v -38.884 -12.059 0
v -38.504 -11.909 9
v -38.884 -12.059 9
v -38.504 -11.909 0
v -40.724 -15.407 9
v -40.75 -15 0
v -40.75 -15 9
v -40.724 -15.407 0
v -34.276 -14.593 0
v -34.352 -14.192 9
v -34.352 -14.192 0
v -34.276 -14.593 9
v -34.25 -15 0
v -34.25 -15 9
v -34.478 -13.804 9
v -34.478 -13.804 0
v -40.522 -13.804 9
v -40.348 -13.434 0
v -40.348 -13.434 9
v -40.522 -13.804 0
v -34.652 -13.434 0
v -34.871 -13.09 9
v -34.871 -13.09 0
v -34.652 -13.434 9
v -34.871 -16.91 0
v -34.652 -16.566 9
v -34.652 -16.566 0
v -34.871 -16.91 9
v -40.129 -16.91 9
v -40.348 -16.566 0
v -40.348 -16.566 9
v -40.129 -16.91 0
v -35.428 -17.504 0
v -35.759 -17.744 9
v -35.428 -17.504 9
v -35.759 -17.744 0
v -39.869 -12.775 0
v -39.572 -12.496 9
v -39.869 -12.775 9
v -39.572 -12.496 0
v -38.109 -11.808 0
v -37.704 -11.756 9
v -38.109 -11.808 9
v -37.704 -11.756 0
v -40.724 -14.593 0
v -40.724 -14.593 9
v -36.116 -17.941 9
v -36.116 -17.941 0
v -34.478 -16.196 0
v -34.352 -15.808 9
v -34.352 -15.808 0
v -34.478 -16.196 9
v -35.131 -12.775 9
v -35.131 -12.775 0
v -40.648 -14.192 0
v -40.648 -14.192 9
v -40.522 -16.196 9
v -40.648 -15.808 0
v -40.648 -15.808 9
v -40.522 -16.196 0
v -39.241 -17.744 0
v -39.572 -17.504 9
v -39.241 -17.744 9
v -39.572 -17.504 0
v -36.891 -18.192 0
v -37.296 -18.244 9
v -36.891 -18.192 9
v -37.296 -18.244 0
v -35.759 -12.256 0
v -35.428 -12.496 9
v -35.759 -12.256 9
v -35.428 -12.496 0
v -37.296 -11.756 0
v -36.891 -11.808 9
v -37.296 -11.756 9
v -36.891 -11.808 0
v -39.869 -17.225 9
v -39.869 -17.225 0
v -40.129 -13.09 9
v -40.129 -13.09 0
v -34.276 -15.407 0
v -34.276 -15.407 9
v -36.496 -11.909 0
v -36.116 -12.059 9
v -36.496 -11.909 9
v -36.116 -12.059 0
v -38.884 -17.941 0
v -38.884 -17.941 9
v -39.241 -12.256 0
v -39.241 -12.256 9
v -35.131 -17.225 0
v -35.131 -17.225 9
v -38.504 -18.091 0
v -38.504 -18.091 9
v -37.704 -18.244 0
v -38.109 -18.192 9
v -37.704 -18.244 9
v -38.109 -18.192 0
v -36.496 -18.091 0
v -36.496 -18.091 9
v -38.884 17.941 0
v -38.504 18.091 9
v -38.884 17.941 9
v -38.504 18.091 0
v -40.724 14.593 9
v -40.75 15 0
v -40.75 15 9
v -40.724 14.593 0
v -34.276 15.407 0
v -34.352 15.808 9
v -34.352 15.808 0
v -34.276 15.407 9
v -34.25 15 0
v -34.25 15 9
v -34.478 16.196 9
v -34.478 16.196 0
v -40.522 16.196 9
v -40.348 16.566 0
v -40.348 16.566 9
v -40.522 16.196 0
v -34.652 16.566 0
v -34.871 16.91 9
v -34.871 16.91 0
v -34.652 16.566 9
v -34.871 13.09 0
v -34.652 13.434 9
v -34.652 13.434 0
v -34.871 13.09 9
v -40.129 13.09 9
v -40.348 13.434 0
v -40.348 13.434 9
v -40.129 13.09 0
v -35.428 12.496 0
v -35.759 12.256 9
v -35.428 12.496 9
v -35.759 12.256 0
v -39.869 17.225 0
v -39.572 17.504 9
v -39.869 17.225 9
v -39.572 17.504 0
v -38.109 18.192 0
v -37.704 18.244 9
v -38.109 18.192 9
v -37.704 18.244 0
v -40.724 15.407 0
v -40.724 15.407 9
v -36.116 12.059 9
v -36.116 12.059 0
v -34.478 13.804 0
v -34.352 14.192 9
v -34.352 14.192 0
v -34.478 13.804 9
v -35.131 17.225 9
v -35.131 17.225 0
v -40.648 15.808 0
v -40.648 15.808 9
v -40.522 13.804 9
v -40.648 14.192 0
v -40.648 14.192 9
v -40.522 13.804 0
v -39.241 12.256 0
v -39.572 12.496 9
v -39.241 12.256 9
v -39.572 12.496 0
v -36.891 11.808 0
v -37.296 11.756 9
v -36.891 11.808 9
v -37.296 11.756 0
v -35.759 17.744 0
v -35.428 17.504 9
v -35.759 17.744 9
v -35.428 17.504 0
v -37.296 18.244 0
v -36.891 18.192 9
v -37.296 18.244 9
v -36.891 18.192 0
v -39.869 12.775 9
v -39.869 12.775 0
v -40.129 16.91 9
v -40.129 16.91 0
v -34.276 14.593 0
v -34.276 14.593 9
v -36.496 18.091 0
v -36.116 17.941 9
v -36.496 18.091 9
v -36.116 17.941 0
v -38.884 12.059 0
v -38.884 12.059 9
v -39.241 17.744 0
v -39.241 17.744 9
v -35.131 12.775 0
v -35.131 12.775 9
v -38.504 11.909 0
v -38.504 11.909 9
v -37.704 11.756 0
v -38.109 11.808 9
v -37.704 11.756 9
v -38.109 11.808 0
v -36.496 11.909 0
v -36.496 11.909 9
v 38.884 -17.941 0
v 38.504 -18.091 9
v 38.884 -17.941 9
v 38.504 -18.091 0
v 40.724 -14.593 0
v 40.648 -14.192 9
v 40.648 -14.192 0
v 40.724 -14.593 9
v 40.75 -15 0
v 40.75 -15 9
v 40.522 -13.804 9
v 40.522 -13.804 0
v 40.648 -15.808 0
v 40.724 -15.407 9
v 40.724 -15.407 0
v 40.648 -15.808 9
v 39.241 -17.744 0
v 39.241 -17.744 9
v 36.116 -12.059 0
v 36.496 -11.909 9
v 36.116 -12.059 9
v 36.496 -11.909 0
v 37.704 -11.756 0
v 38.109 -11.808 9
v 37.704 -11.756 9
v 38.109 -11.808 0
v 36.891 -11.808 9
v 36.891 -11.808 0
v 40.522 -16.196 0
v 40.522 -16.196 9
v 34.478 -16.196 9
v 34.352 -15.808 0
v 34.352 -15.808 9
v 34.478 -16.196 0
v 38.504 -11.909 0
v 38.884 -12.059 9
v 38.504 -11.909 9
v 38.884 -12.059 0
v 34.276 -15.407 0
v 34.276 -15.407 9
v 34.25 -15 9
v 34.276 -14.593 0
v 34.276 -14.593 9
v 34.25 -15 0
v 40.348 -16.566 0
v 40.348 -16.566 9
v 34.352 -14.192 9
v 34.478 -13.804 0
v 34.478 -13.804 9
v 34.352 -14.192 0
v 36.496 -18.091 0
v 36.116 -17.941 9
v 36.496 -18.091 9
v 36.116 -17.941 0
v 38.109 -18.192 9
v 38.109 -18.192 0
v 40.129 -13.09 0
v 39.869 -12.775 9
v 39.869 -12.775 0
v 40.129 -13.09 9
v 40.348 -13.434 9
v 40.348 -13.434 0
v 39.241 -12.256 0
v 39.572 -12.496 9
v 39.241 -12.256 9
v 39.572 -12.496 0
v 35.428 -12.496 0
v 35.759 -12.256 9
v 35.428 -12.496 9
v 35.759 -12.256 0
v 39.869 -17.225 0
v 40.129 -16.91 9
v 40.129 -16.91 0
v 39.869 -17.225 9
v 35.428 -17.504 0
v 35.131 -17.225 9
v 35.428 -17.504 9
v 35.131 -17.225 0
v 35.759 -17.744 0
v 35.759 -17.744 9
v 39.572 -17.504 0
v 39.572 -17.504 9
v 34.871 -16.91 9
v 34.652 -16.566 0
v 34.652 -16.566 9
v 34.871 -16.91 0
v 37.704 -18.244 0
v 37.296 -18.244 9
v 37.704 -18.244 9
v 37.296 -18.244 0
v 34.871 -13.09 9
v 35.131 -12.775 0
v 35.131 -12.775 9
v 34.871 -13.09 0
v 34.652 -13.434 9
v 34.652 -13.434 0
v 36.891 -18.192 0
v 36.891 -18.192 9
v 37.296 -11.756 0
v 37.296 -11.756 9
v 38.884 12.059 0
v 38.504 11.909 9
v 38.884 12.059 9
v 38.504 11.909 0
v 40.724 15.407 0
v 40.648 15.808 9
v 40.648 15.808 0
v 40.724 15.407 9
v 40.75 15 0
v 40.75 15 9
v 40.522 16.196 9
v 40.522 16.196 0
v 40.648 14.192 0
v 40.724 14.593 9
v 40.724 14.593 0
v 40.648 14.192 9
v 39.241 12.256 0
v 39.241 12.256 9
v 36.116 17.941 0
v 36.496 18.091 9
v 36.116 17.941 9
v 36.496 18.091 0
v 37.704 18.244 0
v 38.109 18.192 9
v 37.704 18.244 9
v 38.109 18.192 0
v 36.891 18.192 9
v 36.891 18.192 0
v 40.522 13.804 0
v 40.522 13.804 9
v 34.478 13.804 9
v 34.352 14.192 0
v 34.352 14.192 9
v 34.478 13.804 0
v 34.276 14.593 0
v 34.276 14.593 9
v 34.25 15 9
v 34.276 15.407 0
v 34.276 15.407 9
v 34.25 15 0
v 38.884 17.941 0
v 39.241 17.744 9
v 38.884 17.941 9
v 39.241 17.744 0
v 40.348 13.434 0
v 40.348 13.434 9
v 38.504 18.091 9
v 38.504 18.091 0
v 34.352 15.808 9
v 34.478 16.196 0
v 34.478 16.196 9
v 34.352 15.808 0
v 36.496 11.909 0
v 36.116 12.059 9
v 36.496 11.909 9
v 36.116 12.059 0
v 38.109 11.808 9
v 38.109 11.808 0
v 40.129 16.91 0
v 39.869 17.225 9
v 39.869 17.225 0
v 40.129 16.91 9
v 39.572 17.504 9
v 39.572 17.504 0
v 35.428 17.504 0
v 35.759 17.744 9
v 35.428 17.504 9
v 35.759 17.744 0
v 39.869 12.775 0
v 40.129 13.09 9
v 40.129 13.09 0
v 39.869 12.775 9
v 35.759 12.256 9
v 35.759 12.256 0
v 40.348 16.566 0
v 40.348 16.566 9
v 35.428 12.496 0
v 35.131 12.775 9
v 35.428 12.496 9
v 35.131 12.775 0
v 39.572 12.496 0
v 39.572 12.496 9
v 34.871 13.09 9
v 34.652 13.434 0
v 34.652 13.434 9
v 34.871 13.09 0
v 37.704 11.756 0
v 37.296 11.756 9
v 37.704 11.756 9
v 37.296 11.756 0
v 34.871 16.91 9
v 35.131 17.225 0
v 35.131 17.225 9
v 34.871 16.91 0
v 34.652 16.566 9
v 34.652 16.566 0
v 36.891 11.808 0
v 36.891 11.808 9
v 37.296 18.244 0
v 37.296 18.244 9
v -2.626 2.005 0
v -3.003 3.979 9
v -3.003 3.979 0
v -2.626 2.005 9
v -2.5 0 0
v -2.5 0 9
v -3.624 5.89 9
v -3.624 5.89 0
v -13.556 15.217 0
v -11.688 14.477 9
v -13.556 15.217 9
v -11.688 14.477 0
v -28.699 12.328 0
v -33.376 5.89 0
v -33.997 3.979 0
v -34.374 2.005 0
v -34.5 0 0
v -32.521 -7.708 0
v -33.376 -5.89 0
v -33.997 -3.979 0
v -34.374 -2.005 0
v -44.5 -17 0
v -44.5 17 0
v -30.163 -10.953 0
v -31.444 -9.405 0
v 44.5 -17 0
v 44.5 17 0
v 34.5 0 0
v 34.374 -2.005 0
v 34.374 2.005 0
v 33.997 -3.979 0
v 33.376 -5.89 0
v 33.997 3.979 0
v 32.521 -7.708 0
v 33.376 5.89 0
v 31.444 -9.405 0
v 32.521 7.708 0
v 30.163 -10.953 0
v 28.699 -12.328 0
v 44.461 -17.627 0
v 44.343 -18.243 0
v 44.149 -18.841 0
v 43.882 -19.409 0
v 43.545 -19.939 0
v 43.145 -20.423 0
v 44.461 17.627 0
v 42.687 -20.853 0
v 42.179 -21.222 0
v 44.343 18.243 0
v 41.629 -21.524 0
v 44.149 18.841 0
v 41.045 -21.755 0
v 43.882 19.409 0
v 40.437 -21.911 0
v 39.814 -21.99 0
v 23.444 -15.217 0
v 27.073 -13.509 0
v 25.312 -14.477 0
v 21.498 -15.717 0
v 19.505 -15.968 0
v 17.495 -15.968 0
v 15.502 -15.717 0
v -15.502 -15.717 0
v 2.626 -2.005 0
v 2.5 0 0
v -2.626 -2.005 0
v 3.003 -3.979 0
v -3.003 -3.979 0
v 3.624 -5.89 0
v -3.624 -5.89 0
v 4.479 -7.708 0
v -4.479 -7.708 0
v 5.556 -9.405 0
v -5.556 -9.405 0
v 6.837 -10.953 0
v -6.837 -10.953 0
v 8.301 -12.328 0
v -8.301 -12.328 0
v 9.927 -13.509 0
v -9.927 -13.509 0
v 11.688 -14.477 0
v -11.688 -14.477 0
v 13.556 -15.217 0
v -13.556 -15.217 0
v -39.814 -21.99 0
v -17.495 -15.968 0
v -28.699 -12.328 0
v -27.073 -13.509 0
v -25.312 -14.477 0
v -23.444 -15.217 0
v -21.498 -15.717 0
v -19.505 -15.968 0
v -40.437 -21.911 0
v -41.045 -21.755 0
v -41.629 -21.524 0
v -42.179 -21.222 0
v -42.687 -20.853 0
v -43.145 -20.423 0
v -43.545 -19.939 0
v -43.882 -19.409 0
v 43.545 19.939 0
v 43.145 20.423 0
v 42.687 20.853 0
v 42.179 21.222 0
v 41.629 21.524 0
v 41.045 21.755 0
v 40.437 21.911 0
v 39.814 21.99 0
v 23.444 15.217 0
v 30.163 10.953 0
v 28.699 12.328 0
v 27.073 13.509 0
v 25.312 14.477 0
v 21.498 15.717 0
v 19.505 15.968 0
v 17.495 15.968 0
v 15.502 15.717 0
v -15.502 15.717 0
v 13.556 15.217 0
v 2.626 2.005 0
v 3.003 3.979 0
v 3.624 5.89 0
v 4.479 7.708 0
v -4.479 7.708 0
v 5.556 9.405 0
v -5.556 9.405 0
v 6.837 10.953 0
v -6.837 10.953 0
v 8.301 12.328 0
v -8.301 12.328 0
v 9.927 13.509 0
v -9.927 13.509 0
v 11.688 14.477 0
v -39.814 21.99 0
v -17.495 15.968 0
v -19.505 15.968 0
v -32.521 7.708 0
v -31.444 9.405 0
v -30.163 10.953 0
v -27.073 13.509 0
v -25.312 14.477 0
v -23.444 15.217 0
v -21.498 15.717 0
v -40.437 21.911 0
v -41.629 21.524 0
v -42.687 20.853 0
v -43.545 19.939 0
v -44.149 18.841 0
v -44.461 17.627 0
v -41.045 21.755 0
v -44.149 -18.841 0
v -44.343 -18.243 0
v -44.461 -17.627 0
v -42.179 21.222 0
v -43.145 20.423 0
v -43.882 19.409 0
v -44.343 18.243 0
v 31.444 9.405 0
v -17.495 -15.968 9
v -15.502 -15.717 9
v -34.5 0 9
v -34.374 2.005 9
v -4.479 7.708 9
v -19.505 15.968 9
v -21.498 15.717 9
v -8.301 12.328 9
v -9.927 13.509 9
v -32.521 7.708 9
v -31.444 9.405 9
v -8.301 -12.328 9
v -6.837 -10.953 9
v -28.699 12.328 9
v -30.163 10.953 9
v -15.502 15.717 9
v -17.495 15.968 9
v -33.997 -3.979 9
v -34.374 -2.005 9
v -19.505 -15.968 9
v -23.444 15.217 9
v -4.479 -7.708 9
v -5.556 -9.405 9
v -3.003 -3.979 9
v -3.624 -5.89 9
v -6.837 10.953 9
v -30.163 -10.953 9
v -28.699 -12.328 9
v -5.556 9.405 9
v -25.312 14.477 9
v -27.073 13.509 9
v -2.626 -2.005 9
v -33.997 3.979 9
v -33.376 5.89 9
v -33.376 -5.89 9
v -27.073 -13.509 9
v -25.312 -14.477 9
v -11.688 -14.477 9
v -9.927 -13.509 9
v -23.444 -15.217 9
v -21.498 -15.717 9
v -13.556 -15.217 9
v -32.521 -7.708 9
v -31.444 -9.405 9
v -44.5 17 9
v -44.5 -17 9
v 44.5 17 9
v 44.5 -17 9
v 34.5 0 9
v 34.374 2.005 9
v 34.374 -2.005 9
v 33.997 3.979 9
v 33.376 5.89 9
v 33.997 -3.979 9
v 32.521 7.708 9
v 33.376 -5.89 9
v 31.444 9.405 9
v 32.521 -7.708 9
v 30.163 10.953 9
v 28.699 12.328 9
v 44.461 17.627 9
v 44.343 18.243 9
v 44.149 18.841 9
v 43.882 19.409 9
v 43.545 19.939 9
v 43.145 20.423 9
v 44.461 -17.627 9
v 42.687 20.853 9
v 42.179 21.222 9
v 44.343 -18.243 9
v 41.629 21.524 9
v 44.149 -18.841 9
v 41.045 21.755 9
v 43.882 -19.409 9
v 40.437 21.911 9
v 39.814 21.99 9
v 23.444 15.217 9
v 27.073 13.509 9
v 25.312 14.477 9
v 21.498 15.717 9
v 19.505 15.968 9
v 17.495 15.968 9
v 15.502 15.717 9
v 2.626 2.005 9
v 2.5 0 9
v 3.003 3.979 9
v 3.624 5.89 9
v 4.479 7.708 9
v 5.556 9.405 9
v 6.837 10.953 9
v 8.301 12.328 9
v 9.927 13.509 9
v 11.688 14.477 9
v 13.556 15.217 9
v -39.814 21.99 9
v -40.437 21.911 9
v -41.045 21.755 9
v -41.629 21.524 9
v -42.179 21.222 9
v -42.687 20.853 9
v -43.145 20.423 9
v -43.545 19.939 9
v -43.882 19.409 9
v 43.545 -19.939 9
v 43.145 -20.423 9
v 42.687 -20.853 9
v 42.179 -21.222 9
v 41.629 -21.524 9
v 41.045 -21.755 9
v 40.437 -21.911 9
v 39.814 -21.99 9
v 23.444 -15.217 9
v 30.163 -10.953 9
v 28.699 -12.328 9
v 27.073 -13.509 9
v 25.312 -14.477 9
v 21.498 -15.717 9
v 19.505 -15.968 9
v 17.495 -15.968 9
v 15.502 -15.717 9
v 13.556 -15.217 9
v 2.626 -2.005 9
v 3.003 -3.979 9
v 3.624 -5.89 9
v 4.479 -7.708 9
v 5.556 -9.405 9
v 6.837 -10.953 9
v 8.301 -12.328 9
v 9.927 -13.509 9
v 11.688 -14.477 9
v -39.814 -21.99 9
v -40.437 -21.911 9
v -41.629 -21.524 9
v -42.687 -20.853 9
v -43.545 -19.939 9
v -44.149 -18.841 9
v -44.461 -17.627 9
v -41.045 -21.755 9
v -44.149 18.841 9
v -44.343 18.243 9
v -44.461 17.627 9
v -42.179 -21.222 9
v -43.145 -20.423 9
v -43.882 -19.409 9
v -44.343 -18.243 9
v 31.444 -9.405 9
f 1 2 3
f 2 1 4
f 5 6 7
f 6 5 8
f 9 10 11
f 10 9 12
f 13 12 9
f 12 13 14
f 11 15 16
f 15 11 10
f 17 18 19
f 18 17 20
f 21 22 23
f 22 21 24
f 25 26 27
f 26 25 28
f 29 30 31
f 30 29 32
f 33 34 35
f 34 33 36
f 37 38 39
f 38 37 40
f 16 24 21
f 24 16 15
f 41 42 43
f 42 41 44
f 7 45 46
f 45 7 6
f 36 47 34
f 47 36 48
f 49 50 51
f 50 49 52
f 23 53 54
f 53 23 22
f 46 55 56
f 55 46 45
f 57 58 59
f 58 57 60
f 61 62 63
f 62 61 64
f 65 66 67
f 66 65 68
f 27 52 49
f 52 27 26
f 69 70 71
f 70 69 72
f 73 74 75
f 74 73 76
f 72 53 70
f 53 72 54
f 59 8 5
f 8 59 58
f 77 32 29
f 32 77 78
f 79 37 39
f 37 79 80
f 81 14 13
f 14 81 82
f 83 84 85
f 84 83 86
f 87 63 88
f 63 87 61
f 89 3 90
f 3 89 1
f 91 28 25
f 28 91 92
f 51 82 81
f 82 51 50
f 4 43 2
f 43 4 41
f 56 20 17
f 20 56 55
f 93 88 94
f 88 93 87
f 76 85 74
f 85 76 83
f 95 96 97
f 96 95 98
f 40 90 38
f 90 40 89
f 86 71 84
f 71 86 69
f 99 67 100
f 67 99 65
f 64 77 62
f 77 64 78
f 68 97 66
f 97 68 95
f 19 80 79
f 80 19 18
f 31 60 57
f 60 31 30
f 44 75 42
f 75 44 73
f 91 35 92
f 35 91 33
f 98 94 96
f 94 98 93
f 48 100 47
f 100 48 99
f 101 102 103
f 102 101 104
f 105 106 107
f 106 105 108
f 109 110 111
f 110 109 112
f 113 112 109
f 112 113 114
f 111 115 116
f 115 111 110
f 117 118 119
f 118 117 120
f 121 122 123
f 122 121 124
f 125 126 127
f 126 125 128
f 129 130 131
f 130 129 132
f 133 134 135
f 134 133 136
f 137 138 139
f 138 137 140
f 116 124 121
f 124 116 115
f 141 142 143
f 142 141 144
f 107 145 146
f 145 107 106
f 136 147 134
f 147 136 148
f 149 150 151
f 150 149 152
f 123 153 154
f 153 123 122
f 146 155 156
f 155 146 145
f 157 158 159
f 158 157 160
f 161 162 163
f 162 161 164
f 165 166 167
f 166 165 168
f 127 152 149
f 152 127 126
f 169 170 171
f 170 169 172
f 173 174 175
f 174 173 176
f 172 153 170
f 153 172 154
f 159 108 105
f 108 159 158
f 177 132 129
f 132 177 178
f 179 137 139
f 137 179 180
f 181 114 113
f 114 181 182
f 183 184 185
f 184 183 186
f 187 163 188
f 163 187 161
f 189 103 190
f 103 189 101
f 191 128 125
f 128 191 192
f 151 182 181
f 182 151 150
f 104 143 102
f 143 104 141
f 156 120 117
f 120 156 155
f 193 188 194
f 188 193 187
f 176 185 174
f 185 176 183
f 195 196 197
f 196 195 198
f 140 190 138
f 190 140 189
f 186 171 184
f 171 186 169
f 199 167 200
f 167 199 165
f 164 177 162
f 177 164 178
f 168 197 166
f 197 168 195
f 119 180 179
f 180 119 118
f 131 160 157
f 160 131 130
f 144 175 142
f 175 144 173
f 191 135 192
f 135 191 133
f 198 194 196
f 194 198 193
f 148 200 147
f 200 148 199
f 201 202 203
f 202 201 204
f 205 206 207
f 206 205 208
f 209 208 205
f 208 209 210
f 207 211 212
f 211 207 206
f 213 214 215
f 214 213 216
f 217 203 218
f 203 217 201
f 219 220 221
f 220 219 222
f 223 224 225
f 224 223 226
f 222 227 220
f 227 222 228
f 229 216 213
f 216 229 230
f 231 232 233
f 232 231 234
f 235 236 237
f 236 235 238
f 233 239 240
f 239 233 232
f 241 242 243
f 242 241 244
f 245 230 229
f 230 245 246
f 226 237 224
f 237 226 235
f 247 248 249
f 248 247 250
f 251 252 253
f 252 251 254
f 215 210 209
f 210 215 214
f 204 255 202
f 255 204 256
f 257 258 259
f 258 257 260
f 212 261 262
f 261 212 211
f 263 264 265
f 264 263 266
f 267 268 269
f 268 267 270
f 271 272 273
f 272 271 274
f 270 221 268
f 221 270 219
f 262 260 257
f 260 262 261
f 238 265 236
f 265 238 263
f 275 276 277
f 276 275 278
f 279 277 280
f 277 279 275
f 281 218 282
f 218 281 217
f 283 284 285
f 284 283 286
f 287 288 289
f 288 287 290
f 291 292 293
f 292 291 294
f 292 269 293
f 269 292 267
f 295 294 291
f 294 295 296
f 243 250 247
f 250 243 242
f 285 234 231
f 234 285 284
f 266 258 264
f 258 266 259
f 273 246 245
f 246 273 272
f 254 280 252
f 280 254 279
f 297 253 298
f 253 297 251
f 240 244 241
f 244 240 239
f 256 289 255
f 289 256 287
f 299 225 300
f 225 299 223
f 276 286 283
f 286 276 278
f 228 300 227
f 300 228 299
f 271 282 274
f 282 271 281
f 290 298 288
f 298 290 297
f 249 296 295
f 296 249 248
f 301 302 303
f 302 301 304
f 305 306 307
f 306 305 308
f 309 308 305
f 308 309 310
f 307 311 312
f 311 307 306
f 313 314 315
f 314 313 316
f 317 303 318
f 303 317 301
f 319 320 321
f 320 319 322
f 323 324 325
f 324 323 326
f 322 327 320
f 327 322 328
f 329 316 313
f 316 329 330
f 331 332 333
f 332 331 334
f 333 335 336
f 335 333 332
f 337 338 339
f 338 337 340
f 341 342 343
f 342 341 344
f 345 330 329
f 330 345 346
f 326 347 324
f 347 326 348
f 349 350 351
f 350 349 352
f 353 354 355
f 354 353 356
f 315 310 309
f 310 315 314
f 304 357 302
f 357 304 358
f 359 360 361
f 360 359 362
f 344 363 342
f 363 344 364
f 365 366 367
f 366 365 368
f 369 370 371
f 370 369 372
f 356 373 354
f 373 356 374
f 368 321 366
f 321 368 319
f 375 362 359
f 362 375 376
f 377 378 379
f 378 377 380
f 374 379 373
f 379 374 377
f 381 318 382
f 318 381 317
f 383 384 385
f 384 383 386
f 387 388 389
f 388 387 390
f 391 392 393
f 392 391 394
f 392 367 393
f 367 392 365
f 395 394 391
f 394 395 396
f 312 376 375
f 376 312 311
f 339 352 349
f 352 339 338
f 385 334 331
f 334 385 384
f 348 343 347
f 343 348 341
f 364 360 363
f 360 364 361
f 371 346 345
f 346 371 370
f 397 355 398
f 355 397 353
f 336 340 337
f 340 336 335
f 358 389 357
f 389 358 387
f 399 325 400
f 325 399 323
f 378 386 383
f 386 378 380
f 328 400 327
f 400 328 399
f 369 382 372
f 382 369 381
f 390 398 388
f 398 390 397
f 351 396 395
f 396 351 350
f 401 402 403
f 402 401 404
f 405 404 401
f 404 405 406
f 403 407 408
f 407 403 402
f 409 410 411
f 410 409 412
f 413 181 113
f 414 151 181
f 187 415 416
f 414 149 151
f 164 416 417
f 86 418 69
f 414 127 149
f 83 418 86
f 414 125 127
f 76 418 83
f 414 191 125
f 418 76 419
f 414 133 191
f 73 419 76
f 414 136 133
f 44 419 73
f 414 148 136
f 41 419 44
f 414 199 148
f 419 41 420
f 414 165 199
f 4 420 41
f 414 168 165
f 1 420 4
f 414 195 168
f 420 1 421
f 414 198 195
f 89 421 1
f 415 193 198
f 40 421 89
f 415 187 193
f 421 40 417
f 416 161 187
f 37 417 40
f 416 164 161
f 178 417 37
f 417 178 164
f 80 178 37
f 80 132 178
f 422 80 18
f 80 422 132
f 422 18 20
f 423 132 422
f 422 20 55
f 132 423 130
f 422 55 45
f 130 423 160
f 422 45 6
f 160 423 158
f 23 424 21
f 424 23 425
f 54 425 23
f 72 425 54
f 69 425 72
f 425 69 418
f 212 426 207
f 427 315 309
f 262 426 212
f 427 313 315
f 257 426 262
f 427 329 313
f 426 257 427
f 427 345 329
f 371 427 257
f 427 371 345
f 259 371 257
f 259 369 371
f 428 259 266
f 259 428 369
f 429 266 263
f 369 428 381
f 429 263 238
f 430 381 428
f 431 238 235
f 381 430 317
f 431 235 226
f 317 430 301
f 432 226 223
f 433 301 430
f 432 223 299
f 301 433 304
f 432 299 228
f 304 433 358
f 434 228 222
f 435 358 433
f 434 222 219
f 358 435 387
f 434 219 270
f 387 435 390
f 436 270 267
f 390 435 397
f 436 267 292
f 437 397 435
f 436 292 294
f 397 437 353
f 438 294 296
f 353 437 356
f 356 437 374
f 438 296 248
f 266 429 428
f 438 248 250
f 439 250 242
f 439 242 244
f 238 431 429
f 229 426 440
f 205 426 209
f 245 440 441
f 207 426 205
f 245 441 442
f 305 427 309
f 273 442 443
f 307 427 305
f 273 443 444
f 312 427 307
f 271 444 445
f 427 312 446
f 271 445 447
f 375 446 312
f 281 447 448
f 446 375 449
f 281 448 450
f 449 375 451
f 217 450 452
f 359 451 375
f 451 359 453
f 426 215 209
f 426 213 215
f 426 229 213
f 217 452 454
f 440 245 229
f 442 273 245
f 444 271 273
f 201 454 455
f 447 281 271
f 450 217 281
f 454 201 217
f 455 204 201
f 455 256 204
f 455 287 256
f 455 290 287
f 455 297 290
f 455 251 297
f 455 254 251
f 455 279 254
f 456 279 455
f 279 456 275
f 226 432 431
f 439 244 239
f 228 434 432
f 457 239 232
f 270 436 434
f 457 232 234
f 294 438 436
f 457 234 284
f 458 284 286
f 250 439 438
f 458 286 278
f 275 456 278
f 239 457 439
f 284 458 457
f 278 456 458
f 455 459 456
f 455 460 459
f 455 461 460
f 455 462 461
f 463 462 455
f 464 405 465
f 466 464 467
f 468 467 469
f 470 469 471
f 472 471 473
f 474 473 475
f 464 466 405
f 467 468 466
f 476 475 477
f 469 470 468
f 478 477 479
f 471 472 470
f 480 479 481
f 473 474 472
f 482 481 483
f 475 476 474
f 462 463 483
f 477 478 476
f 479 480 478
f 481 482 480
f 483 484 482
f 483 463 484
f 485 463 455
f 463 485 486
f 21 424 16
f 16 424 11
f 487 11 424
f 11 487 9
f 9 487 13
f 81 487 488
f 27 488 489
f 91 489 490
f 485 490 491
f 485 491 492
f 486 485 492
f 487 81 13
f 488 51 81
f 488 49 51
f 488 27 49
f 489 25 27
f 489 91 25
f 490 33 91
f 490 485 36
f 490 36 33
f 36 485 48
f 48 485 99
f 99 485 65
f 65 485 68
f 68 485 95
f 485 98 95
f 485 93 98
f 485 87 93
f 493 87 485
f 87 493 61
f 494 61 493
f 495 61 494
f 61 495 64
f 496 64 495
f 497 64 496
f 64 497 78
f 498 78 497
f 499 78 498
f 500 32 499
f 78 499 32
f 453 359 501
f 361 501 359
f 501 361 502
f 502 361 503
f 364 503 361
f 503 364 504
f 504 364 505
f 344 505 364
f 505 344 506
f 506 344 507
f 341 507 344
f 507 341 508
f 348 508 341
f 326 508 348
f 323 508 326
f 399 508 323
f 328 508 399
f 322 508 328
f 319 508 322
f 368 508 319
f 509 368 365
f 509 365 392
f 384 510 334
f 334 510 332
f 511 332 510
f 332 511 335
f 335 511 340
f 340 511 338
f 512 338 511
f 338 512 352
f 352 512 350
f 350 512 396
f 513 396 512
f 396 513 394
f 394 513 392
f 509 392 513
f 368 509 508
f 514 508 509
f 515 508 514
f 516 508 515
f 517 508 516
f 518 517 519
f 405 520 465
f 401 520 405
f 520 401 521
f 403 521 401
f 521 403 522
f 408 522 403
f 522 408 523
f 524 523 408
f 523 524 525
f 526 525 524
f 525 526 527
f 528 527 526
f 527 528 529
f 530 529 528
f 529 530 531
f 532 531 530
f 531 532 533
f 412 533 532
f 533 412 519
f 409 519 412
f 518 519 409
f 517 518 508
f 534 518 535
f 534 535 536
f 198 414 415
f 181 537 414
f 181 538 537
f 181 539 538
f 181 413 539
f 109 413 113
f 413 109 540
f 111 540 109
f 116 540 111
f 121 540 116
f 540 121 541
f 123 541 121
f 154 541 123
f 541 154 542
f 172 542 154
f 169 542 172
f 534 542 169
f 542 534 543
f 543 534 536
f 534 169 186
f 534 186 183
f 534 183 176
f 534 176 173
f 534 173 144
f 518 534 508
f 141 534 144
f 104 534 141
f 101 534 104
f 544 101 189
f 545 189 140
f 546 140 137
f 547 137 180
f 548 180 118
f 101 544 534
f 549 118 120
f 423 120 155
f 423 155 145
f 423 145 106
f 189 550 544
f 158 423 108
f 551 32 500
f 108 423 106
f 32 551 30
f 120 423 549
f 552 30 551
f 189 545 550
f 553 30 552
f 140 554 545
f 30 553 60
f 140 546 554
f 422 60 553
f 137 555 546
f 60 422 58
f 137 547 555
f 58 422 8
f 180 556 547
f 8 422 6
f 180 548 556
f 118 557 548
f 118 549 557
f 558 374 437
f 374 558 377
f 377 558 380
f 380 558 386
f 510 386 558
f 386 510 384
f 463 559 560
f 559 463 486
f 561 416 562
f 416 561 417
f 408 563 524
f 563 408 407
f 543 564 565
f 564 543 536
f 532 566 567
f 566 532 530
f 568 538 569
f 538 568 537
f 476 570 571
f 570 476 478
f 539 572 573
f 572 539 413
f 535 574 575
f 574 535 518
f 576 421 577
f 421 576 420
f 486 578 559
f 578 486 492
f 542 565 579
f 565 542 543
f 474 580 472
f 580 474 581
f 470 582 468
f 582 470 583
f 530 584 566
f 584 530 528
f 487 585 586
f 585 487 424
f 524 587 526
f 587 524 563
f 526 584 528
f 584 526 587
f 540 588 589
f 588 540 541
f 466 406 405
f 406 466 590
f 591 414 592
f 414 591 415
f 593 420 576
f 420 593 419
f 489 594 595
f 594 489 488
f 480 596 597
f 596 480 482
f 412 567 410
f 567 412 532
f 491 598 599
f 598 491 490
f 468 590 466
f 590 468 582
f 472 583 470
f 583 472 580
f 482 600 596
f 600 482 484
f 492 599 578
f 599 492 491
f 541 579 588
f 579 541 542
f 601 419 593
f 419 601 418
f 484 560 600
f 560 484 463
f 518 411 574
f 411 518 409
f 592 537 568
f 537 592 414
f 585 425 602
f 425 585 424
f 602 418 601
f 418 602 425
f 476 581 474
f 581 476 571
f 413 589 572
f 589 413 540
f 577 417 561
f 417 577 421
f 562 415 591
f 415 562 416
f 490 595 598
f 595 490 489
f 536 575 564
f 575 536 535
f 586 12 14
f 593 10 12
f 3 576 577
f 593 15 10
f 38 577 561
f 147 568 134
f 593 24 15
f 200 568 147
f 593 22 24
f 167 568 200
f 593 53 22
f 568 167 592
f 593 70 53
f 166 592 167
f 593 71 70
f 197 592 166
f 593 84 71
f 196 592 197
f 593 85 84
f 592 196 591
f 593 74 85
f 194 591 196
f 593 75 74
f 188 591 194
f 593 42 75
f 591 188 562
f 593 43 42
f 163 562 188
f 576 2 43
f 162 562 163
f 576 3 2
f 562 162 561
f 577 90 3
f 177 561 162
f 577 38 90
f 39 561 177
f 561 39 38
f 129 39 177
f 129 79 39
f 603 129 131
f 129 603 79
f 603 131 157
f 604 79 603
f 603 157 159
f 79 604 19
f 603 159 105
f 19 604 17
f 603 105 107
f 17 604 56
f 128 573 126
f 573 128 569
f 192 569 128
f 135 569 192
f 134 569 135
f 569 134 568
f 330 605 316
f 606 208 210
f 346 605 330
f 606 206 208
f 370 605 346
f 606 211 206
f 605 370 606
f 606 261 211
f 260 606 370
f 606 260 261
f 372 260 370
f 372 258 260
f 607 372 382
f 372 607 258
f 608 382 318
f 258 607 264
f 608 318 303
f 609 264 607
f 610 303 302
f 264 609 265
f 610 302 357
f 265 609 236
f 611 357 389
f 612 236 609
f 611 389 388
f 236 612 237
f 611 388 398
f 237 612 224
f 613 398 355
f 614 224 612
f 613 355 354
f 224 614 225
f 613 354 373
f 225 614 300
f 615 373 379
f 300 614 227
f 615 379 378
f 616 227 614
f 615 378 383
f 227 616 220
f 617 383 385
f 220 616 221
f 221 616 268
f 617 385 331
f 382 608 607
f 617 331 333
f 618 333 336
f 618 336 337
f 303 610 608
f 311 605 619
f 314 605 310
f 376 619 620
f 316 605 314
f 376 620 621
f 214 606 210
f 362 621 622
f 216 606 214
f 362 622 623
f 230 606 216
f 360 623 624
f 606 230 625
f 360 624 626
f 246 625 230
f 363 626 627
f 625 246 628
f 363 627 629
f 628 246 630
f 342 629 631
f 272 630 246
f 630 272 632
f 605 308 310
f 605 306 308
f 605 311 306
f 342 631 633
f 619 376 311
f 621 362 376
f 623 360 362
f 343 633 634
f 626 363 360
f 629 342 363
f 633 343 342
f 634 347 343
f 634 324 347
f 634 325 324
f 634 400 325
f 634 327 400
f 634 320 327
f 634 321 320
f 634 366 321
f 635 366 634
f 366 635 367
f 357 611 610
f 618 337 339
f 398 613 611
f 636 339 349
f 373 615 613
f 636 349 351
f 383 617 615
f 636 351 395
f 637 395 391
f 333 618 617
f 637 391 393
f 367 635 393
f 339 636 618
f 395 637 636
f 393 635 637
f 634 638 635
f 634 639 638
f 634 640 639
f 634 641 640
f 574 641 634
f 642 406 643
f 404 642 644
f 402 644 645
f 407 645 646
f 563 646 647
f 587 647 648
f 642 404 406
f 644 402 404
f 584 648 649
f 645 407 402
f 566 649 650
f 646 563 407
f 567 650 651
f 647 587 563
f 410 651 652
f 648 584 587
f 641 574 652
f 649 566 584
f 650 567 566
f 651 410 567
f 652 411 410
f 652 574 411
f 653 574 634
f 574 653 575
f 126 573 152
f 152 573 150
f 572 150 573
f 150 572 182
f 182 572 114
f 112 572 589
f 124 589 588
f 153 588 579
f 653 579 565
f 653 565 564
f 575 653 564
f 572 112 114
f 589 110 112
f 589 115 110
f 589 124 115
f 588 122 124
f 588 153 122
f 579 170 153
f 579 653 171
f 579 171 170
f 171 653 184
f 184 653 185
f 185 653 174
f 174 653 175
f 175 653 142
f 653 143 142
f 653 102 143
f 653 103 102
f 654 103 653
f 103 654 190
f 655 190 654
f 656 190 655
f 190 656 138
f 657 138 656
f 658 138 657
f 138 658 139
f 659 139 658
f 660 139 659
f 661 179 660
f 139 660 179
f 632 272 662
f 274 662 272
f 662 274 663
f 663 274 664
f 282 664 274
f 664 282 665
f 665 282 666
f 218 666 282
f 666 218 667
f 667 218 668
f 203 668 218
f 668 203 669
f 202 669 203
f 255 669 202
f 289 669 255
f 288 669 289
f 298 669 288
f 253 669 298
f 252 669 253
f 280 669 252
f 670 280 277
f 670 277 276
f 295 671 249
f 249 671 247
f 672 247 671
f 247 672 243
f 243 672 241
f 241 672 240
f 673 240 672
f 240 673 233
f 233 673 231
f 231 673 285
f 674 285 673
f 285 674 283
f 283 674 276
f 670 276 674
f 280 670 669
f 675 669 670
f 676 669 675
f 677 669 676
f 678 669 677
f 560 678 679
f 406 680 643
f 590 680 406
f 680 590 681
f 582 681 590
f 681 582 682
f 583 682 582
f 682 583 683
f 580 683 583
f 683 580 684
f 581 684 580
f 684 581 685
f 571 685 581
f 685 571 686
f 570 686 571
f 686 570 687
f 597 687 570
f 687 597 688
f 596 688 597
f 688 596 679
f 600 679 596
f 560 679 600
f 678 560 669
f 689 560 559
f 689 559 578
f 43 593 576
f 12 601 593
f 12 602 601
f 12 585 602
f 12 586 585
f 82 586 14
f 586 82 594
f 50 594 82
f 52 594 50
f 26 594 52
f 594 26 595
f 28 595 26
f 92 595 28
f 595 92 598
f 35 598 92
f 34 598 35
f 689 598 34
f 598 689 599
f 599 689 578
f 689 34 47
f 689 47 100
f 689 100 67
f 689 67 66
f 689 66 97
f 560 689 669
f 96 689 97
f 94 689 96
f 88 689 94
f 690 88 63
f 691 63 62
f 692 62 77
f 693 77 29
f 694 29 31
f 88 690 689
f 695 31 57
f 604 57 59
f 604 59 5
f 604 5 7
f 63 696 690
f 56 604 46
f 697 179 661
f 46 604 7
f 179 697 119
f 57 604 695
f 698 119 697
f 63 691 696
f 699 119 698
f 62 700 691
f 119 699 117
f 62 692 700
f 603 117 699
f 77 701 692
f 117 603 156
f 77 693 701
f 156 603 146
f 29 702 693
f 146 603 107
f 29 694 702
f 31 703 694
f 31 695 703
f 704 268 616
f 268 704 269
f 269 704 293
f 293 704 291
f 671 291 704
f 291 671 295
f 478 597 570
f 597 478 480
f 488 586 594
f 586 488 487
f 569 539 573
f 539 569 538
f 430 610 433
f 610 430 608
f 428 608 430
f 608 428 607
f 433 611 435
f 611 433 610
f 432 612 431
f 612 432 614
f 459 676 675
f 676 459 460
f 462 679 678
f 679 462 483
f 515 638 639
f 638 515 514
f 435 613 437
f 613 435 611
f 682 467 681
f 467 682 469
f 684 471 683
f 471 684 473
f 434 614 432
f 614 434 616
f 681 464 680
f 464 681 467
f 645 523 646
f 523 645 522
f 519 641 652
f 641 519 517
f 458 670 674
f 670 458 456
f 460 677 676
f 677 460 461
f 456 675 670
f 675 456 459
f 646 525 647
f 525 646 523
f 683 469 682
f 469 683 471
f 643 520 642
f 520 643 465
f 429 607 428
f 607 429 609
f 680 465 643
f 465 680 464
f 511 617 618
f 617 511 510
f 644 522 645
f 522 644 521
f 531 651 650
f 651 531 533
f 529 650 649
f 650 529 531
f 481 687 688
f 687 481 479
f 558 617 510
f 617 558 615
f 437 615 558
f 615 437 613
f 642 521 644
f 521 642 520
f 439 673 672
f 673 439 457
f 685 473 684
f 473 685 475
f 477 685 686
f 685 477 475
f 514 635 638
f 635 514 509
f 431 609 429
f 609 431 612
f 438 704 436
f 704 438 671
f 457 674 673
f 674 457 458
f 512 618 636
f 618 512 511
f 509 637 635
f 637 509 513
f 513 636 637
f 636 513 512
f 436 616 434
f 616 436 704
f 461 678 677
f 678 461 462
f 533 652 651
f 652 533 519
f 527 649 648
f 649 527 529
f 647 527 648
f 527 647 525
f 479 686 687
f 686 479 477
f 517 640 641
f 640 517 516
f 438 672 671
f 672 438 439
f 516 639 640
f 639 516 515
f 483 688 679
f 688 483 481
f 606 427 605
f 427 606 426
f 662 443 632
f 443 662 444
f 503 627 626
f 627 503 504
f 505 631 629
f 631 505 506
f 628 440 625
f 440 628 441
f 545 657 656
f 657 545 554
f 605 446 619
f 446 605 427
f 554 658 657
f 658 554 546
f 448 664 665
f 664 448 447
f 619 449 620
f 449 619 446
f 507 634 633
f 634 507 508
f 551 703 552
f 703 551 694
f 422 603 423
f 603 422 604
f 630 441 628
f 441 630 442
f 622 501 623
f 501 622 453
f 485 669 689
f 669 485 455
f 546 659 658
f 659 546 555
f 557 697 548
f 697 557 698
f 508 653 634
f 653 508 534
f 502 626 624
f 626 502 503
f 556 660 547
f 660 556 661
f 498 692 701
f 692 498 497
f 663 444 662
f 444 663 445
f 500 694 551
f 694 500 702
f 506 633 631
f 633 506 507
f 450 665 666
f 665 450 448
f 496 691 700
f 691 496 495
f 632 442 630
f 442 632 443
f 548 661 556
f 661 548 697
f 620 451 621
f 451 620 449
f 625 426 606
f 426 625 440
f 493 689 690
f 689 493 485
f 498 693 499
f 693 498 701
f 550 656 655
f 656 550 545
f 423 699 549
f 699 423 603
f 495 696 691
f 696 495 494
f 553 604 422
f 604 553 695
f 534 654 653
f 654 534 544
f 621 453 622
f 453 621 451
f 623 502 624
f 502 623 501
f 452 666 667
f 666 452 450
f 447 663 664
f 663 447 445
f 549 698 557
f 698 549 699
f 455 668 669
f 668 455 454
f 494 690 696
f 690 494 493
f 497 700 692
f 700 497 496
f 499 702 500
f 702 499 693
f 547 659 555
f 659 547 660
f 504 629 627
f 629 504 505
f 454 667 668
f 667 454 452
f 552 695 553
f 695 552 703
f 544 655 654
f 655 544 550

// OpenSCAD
$fn = 50;


difference() {
	union() {
		hull() {
			translate(v = [-39.5000000000, 17.0000000000, 0]) {
				cylinder(h = 9, r = 5);
			}
			translate(v = [39.5000000000, 17.0000000000, 0]) {
				cylinder(h = 9, r = 5);
			}
			translate(v = [-39.5000000000, -17.0000000000, 0]) {
				cylinder(h = 9, r = 5);
			}
			translate(v = [39.5000000000, -17.0000000000, 0]) {
				cylinder(h = 9, r = 5);
			}
		}
	}
	union() {
		#translate(v = [-37.5000000000, -15.0000000000, -100.0000000000]) {
			cylinder(h = 200, r = 3.2500000000);
		}
		#translate(v = [-37.5000000000, 15.0000000000, -100.0000000000]) {
			cylinder(h = 200, r = 3.2500000000);
		}
		#translate(v = [37.5000000000, -15.0000000000, -100.0000000000]) {
			cylinder(h = 200, r = 3.2500000000);
		}
		#translate(v = [37.5000000000, 15.0000000000, -100.0000000000]) {
			cylinder(h = 200, r = 3.2500000000);
		}
		#translate(v = [-18.5000000000, 0, 0]) {
			cylinder(h = 9, r = 16.0000000000);
		}
		#translate(v = [18.5000000000, 0, 0]) {
			cylinder(h = 9, r = 16.0000000000);
		}
	}
}
